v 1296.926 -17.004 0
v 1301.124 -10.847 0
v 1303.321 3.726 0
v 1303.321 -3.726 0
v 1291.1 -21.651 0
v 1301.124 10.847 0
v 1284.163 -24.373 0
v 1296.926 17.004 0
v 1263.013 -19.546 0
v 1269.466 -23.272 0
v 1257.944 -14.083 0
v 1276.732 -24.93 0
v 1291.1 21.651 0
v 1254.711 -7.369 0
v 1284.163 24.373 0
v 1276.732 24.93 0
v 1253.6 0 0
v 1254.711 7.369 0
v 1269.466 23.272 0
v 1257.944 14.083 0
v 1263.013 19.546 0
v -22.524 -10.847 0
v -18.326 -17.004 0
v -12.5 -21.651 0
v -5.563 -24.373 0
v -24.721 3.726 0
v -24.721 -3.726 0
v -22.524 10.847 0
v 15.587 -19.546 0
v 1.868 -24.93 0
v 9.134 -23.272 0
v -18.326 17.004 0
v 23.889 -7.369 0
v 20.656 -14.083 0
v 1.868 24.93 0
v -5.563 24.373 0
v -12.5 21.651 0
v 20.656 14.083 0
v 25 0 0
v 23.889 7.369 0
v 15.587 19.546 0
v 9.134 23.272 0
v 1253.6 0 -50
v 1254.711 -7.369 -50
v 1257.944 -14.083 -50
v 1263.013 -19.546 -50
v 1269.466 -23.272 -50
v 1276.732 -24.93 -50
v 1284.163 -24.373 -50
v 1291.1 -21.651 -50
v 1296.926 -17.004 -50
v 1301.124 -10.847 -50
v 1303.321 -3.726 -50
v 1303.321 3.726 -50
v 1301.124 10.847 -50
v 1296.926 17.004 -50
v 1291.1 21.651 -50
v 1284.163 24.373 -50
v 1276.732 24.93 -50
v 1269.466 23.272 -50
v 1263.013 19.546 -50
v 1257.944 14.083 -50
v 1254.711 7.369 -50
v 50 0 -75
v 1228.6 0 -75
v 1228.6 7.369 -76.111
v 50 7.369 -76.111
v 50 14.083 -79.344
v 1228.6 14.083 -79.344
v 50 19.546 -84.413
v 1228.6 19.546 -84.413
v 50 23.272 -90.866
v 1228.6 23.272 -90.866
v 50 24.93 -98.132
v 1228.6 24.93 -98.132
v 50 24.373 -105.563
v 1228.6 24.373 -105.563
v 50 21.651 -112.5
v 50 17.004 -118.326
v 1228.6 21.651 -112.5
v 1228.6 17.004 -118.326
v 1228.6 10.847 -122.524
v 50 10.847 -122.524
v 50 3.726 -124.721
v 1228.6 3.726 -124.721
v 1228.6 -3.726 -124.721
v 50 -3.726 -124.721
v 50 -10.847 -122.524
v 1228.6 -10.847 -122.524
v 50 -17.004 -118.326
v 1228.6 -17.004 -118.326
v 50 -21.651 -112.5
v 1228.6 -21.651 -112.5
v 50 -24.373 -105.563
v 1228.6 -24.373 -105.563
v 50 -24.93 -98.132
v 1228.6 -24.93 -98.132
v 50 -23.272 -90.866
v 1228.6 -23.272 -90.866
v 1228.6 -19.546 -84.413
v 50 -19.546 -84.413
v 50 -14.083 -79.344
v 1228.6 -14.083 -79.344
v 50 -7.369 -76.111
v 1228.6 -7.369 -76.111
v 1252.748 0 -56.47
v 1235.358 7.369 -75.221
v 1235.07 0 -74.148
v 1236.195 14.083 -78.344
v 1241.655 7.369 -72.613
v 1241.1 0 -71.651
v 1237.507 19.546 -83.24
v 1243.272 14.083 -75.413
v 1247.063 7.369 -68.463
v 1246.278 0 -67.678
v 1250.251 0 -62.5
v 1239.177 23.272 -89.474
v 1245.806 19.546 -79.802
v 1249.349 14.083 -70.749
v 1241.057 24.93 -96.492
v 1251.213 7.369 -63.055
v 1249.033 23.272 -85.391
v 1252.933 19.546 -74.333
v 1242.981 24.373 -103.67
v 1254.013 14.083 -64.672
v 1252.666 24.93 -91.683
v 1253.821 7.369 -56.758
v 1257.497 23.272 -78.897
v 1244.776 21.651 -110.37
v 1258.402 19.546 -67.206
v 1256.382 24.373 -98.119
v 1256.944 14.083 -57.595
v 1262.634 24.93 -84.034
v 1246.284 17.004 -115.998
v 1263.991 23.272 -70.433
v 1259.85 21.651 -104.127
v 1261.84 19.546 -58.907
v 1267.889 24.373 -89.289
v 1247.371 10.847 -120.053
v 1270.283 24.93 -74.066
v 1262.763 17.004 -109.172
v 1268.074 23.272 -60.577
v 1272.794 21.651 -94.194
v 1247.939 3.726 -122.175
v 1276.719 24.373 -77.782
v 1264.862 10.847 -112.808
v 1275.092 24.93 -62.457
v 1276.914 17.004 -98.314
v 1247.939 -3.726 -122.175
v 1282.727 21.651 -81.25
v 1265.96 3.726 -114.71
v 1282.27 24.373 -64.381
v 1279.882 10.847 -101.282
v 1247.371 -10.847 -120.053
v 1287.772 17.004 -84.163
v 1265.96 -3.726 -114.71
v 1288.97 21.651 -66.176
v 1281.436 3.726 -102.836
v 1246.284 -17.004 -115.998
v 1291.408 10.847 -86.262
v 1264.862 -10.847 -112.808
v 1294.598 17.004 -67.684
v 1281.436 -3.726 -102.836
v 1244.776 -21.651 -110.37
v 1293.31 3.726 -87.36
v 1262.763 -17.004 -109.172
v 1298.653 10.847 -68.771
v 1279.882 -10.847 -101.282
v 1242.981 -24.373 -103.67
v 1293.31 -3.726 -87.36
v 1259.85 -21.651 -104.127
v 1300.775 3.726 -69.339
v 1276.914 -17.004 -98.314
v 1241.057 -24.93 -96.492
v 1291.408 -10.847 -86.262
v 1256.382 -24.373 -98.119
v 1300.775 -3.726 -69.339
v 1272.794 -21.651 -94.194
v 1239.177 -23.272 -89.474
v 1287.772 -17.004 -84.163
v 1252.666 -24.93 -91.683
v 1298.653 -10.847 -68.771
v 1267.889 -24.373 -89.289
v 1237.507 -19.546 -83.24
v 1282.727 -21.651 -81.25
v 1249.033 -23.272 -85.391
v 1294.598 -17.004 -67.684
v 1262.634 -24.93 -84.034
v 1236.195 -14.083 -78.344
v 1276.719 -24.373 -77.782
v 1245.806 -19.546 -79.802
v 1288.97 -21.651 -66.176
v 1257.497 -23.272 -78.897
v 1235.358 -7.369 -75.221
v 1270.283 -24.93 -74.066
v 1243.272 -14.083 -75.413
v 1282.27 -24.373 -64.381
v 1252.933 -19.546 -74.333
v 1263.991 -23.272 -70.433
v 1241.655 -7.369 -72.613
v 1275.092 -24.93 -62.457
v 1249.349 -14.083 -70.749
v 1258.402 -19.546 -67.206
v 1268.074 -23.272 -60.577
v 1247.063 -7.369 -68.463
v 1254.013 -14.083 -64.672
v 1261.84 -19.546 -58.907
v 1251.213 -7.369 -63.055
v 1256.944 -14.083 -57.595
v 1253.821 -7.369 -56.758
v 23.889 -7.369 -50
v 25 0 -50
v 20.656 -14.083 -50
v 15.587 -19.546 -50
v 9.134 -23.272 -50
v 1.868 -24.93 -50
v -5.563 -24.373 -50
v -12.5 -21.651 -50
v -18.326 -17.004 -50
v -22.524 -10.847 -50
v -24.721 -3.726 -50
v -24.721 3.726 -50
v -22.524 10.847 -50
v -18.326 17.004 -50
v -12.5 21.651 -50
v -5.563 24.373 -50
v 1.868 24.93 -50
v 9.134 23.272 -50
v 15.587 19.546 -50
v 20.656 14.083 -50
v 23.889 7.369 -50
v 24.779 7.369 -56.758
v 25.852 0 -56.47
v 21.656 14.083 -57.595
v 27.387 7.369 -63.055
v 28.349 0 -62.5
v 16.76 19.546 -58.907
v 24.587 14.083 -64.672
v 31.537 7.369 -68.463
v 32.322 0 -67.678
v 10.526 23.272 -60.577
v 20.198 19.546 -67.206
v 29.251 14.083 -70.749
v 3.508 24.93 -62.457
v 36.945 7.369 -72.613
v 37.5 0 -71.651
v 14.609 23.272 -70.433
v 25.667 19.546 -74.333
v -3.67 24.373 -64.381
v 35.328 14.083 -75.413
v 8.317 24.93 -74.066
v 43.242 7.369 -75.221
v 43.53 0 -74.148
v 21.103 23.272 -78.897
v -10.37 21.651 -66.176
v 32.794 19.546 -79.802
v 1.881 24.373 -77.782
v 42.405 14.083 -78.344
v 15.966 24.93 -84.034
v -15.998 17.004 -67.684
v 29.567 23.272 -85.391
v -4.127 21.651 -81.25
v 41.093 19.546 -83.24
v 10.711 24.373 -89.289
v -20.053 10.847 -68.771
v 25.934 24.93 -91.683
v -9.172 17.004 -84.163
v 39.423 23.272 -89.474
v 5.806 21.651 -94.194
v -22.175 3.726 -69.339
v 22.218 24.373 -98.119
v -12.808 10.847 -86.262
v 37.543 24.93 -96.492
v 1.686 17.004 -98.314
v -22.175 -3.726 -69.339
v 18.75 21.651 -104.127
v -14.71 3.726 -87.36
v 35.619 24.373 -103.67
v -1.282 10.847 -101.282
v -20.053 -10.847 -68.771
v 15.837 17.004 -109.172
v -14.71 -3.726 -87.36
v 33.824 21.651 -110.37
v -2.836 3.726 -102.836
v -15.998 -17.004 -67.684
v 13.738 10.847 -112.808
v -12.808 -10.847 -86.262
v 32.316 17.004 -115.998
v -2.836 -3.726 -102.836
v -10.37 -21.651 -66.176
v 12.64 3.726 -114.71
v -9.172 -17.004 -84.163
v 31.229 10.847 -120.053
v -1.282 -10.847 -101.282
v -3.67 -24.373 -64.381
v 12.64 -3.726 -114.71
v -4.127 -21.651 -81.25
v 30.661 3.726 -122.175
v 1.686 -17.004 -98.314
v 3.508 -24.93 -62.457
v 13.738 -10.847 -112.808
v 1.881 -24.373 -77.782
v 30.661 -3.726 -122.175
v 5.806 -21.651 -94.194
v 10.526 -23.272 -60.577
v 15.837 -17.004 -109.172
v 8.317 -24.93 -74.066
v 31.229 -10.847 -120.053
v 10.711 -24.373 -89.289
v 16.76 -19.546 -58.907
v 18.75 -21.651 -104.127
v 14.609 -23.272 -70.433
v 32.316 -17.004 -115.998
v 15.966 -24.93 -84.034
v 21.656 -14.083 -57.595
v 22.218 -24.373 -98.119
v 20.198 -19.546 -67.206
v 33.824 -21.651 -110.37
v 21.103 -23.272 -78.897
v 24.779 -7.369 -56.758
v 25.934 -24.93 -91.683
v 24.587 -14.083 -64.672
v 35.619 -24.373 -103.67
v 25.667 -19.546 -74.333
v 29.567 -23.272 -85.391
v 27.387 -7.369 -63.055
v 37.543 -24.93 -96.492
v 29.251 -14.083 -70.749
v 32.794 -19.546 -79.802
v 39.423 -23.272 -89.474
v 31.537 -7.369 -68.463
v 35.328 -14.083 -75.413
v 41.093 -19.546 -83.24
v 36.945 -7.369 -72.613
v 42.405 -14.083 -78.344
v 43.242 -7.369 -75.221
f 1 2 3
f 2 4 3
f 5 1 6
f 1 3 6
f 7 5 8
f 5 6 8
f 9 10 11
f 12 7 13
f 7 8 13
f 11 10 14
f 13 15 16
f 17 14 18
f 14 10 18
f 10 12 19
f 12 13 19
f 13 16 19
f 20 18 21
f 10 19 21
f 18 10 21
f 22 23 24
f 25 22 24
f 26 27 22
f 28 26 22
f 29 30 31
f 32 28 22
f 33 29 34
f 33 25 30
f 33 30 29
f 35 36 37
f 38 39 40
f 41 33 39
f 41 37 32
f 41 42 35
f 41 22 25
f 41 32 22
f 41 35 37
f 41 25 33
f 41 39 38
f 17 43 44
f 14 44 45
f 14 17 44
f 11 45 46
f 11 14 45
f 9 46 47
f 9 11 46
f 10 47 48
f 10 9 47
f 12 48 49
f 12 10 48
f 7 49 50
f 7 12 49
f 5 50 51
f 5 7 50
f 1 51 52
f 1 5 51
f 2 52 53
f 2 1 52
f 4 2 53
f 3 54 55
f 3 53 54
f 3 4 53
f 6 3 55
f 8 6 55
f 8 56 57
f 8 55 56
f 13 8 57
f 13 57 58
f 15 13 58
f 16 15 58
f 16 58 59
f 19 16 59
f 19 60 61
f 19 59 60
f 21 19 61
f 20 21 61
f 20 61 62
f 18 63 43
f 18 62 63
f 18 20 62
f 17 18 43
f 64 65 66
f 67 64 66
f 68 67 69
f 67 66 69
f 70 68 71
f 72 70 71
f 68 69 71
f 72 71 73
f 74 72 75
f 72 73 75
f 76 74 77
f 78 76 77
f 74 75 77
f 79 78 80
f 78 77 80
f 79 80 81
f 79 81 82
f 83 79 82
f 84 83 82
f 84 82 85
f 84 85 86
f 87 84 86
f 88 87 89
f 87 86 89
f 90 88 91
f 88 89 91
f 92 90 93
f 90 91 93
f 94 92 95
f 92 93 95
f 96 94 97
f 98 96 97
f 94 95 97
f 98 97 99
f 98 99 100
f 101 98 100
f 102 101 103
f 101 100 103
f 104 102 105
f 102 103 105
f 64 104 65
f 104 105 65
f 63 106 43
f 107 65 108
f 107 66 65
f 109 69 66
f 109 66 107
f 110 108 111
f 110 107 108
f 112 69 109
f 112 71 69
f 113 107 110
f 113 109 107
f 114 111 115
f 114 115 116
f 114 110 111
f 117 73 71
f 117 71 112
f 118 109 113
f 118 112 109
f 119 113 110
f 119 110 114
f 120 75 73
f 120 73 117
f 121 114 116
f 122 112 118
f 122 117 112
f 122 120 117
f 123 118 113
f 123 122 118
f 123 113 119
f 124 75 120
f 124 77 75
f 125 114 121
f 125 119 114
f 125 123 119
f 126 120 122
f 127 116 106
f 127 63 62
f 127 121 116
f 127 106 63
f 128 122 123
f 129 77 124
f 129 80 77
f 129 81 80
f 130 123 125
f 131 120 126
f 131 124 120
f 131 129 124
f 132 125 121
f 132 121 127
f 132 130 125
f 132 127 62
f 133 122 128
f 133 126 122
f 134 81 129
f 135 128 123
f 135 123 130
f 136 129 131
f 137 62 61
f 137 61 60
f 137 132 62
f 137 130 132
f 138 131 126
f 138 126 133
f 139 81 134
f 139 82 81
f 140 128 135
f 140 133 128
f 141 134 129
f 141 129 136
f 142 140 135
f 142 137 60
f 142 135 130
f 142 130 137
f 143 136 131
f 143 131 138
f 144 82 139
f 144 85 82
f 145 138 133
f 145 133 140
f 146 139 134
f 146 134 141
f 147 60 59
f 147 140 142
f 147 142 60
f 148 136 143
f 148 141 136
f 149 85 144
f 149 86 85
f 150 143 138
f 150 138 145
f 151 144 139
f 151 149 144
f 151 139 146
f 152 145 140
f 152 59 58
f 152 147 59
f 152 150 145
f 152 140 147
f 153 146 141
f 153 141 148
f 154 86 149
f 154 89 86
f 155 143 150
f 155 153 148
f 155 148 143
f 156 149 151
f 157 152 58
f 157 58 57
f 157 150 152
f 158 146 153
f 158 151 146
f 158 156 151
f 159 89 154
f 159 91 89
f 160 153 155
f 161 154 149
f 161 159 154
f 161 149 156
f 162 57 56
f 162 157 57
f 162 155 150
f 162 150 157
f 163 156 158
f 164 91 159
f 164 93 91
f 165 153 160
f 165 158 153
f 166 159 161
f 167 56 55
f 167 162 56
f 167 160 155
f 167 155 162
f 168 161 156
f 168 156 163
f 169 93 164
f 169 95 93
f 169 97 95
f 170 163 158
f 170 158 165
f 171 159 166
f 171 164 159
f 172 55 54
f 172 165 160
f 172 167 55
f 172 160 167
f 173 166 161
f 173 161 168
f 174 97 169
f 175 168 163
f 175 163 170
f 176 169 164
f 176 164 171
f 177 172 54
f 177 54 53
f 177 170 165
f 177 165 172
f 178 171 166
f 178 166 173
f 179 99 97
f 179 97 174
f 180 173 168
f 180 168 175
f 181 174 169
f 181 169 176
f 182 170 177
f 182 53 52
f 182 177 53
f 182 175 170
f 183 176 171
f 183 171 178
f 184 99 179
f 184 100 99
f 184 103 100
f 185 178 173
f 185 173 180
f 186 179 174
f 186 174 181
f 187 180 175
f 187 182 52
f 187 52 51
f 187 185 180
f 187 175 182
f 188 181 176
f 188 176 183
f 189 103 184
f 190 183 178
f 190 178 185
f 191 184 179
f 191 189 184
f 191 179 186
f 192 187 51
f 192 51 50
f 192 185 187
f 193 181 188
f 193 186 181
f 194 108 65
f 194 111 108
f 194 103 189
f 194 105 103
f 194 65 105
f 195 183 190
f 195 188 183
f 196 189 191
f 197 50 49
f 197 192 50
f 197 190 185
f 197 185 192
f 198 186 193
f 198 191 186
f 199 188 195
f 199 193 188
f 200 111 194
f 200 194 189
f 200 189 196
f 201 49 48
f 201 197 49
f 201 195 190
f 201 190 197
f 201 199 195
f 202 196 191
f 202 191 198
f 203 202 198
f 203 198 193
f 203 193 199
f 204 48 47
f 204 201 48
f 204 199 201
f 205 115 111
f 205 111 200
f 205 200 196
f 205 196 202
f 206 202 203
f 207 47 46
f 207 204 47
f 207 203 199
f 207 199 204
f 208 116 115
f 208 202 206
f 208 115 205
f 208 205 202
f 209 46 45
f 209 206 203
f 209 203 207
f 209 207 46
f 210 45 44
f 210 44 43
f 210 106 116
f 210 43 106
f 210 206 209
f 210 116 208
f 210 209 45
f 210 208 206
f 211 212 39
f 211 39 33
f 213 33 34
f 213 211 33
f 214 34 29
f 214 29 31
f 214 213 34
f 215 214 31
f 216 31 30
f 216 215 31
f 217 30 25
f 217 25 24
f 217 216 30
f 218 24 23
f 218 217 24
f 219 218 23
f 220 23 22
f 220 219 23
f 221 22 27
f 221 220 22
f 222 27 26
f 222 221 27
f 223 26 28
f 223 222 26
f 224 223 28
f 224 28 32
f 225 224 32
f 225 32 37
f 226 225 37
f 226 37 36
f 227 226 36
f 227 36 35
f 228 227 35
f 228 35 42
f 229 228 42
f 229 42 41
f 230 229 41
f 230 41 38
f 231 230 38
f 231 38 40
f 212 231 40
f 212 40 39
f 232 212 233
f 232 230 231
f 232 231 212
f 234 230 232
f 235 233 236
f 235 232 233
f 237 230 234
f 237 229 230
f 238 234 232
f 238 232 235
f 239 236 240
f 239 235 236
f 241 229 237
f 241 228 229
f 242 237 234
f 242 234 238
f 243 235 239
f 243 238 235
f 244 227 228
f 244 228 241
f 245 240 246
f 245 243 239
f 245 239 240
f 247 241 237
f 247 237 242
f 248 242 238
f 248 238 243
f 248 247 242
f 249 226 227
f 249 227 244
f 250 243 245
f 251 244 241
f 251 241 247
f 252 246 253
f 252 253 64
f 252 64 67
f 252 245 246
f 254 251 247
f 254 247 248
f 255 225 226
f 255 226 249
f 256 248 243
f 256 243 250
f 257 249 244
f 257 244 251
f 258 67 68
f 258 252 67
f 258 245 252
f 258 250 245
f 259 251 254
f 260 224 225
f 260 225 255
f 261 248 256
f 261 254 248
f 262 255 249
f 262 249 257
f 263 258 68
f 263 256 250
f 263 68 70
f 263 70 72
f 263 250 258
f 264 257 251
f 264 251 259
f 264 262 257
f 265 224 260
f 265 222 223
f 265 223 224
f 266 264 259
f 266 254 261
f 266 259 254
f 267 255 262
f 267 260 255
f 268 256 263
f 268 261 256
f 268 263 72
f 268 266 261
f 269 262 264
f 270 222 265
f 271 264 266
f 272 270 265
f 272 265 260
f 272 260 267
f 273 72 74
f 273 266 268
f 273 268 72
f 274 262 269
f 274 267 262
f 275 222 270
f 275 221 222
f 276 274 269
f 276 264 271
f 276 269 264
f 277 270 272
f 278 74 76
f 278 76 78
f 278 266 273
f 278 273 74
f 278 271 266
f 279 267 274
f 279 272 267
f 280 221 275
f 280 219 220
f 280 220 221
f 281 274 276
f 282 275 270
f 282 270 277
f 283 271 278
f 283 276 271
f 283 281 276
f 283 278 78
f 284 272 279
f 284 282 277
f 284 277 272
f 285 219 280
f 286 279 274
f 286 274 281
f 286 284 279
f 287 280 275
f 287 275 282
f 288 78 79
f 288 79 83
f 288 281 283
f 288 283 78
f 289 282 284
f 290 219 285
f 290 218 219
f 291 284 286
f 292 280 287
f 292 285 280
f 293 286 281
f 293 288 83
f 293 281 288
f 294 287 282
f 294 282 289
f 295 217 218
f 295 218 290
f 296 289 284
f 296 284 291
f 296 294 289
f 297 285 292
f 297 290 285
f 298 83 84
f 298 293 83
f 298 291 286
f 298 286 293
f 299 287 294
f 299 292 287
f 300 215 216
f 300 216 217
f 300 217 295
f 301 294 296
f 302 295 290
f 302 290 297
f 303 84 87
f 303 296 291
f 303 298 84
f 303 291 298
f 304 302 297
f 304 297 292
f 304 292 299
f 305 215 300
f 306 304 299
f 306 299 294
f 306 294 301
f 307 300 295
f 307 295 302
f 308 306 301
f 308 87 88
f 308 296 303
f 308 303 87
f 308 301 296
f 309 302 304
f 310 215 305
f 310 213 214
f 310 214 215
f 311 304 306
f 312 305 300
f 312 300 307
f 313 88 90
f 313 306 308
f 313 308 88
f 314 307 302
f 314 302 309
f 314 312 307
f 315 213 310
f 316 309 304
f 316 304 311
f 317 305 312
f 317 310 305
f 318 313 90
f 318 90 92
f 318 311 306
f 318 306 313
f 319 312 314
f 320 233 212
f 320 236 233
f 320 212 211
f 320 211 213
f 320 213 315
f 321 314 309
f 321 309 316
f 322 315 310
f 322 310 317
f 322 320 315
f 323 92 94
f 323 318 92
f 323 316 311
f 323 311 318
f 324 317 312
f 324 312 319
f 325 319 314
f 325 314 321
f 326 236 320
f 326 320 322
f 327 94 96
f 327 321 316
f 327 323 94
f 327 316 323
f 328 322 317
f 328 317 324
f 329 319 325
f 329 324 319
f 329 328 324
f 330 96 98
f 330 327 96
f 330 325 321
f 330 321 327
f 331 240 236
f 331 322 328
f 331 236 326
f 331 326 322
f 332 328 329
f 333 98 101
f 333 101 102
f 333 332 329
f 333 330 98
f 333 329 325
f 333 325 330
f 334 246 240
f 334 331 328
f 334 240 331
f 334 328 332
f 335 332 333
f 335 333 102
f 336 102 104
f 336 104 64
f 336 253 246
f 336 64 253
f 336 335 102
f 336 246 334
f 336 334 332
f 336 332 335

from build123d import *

# Parameters (mm, degrees)
SKETCH2_R = 25


with BuildPart() as part:
    # Sweep1: sweep along a path in Sketch1
    with BuildLine(Plane(origin=(0, 0, 0), x_dir=(1, 0, 0), z_dir=(0, 1, 0))) as sweep1_path:
        Line((0, 0), (0, 50))
        ThreePointArc((0, 50), (14.644660941, 85.355339059), (50, 100))
        Line((50, 100), (1228.6, 100))
        ThreePointArc((1228.6, 100), (1263.955339059, 85.355339059), (1278.6, 50))
        Line((1278.6, 50), (1278.6, 0))
    # Sketch2 → Sweep1 (sweep)
    with BuildSketch(Plane.XY):
        Circle(SKETCH2_R)
    sweep(path=sweep1_path.line)


solid = part.part
